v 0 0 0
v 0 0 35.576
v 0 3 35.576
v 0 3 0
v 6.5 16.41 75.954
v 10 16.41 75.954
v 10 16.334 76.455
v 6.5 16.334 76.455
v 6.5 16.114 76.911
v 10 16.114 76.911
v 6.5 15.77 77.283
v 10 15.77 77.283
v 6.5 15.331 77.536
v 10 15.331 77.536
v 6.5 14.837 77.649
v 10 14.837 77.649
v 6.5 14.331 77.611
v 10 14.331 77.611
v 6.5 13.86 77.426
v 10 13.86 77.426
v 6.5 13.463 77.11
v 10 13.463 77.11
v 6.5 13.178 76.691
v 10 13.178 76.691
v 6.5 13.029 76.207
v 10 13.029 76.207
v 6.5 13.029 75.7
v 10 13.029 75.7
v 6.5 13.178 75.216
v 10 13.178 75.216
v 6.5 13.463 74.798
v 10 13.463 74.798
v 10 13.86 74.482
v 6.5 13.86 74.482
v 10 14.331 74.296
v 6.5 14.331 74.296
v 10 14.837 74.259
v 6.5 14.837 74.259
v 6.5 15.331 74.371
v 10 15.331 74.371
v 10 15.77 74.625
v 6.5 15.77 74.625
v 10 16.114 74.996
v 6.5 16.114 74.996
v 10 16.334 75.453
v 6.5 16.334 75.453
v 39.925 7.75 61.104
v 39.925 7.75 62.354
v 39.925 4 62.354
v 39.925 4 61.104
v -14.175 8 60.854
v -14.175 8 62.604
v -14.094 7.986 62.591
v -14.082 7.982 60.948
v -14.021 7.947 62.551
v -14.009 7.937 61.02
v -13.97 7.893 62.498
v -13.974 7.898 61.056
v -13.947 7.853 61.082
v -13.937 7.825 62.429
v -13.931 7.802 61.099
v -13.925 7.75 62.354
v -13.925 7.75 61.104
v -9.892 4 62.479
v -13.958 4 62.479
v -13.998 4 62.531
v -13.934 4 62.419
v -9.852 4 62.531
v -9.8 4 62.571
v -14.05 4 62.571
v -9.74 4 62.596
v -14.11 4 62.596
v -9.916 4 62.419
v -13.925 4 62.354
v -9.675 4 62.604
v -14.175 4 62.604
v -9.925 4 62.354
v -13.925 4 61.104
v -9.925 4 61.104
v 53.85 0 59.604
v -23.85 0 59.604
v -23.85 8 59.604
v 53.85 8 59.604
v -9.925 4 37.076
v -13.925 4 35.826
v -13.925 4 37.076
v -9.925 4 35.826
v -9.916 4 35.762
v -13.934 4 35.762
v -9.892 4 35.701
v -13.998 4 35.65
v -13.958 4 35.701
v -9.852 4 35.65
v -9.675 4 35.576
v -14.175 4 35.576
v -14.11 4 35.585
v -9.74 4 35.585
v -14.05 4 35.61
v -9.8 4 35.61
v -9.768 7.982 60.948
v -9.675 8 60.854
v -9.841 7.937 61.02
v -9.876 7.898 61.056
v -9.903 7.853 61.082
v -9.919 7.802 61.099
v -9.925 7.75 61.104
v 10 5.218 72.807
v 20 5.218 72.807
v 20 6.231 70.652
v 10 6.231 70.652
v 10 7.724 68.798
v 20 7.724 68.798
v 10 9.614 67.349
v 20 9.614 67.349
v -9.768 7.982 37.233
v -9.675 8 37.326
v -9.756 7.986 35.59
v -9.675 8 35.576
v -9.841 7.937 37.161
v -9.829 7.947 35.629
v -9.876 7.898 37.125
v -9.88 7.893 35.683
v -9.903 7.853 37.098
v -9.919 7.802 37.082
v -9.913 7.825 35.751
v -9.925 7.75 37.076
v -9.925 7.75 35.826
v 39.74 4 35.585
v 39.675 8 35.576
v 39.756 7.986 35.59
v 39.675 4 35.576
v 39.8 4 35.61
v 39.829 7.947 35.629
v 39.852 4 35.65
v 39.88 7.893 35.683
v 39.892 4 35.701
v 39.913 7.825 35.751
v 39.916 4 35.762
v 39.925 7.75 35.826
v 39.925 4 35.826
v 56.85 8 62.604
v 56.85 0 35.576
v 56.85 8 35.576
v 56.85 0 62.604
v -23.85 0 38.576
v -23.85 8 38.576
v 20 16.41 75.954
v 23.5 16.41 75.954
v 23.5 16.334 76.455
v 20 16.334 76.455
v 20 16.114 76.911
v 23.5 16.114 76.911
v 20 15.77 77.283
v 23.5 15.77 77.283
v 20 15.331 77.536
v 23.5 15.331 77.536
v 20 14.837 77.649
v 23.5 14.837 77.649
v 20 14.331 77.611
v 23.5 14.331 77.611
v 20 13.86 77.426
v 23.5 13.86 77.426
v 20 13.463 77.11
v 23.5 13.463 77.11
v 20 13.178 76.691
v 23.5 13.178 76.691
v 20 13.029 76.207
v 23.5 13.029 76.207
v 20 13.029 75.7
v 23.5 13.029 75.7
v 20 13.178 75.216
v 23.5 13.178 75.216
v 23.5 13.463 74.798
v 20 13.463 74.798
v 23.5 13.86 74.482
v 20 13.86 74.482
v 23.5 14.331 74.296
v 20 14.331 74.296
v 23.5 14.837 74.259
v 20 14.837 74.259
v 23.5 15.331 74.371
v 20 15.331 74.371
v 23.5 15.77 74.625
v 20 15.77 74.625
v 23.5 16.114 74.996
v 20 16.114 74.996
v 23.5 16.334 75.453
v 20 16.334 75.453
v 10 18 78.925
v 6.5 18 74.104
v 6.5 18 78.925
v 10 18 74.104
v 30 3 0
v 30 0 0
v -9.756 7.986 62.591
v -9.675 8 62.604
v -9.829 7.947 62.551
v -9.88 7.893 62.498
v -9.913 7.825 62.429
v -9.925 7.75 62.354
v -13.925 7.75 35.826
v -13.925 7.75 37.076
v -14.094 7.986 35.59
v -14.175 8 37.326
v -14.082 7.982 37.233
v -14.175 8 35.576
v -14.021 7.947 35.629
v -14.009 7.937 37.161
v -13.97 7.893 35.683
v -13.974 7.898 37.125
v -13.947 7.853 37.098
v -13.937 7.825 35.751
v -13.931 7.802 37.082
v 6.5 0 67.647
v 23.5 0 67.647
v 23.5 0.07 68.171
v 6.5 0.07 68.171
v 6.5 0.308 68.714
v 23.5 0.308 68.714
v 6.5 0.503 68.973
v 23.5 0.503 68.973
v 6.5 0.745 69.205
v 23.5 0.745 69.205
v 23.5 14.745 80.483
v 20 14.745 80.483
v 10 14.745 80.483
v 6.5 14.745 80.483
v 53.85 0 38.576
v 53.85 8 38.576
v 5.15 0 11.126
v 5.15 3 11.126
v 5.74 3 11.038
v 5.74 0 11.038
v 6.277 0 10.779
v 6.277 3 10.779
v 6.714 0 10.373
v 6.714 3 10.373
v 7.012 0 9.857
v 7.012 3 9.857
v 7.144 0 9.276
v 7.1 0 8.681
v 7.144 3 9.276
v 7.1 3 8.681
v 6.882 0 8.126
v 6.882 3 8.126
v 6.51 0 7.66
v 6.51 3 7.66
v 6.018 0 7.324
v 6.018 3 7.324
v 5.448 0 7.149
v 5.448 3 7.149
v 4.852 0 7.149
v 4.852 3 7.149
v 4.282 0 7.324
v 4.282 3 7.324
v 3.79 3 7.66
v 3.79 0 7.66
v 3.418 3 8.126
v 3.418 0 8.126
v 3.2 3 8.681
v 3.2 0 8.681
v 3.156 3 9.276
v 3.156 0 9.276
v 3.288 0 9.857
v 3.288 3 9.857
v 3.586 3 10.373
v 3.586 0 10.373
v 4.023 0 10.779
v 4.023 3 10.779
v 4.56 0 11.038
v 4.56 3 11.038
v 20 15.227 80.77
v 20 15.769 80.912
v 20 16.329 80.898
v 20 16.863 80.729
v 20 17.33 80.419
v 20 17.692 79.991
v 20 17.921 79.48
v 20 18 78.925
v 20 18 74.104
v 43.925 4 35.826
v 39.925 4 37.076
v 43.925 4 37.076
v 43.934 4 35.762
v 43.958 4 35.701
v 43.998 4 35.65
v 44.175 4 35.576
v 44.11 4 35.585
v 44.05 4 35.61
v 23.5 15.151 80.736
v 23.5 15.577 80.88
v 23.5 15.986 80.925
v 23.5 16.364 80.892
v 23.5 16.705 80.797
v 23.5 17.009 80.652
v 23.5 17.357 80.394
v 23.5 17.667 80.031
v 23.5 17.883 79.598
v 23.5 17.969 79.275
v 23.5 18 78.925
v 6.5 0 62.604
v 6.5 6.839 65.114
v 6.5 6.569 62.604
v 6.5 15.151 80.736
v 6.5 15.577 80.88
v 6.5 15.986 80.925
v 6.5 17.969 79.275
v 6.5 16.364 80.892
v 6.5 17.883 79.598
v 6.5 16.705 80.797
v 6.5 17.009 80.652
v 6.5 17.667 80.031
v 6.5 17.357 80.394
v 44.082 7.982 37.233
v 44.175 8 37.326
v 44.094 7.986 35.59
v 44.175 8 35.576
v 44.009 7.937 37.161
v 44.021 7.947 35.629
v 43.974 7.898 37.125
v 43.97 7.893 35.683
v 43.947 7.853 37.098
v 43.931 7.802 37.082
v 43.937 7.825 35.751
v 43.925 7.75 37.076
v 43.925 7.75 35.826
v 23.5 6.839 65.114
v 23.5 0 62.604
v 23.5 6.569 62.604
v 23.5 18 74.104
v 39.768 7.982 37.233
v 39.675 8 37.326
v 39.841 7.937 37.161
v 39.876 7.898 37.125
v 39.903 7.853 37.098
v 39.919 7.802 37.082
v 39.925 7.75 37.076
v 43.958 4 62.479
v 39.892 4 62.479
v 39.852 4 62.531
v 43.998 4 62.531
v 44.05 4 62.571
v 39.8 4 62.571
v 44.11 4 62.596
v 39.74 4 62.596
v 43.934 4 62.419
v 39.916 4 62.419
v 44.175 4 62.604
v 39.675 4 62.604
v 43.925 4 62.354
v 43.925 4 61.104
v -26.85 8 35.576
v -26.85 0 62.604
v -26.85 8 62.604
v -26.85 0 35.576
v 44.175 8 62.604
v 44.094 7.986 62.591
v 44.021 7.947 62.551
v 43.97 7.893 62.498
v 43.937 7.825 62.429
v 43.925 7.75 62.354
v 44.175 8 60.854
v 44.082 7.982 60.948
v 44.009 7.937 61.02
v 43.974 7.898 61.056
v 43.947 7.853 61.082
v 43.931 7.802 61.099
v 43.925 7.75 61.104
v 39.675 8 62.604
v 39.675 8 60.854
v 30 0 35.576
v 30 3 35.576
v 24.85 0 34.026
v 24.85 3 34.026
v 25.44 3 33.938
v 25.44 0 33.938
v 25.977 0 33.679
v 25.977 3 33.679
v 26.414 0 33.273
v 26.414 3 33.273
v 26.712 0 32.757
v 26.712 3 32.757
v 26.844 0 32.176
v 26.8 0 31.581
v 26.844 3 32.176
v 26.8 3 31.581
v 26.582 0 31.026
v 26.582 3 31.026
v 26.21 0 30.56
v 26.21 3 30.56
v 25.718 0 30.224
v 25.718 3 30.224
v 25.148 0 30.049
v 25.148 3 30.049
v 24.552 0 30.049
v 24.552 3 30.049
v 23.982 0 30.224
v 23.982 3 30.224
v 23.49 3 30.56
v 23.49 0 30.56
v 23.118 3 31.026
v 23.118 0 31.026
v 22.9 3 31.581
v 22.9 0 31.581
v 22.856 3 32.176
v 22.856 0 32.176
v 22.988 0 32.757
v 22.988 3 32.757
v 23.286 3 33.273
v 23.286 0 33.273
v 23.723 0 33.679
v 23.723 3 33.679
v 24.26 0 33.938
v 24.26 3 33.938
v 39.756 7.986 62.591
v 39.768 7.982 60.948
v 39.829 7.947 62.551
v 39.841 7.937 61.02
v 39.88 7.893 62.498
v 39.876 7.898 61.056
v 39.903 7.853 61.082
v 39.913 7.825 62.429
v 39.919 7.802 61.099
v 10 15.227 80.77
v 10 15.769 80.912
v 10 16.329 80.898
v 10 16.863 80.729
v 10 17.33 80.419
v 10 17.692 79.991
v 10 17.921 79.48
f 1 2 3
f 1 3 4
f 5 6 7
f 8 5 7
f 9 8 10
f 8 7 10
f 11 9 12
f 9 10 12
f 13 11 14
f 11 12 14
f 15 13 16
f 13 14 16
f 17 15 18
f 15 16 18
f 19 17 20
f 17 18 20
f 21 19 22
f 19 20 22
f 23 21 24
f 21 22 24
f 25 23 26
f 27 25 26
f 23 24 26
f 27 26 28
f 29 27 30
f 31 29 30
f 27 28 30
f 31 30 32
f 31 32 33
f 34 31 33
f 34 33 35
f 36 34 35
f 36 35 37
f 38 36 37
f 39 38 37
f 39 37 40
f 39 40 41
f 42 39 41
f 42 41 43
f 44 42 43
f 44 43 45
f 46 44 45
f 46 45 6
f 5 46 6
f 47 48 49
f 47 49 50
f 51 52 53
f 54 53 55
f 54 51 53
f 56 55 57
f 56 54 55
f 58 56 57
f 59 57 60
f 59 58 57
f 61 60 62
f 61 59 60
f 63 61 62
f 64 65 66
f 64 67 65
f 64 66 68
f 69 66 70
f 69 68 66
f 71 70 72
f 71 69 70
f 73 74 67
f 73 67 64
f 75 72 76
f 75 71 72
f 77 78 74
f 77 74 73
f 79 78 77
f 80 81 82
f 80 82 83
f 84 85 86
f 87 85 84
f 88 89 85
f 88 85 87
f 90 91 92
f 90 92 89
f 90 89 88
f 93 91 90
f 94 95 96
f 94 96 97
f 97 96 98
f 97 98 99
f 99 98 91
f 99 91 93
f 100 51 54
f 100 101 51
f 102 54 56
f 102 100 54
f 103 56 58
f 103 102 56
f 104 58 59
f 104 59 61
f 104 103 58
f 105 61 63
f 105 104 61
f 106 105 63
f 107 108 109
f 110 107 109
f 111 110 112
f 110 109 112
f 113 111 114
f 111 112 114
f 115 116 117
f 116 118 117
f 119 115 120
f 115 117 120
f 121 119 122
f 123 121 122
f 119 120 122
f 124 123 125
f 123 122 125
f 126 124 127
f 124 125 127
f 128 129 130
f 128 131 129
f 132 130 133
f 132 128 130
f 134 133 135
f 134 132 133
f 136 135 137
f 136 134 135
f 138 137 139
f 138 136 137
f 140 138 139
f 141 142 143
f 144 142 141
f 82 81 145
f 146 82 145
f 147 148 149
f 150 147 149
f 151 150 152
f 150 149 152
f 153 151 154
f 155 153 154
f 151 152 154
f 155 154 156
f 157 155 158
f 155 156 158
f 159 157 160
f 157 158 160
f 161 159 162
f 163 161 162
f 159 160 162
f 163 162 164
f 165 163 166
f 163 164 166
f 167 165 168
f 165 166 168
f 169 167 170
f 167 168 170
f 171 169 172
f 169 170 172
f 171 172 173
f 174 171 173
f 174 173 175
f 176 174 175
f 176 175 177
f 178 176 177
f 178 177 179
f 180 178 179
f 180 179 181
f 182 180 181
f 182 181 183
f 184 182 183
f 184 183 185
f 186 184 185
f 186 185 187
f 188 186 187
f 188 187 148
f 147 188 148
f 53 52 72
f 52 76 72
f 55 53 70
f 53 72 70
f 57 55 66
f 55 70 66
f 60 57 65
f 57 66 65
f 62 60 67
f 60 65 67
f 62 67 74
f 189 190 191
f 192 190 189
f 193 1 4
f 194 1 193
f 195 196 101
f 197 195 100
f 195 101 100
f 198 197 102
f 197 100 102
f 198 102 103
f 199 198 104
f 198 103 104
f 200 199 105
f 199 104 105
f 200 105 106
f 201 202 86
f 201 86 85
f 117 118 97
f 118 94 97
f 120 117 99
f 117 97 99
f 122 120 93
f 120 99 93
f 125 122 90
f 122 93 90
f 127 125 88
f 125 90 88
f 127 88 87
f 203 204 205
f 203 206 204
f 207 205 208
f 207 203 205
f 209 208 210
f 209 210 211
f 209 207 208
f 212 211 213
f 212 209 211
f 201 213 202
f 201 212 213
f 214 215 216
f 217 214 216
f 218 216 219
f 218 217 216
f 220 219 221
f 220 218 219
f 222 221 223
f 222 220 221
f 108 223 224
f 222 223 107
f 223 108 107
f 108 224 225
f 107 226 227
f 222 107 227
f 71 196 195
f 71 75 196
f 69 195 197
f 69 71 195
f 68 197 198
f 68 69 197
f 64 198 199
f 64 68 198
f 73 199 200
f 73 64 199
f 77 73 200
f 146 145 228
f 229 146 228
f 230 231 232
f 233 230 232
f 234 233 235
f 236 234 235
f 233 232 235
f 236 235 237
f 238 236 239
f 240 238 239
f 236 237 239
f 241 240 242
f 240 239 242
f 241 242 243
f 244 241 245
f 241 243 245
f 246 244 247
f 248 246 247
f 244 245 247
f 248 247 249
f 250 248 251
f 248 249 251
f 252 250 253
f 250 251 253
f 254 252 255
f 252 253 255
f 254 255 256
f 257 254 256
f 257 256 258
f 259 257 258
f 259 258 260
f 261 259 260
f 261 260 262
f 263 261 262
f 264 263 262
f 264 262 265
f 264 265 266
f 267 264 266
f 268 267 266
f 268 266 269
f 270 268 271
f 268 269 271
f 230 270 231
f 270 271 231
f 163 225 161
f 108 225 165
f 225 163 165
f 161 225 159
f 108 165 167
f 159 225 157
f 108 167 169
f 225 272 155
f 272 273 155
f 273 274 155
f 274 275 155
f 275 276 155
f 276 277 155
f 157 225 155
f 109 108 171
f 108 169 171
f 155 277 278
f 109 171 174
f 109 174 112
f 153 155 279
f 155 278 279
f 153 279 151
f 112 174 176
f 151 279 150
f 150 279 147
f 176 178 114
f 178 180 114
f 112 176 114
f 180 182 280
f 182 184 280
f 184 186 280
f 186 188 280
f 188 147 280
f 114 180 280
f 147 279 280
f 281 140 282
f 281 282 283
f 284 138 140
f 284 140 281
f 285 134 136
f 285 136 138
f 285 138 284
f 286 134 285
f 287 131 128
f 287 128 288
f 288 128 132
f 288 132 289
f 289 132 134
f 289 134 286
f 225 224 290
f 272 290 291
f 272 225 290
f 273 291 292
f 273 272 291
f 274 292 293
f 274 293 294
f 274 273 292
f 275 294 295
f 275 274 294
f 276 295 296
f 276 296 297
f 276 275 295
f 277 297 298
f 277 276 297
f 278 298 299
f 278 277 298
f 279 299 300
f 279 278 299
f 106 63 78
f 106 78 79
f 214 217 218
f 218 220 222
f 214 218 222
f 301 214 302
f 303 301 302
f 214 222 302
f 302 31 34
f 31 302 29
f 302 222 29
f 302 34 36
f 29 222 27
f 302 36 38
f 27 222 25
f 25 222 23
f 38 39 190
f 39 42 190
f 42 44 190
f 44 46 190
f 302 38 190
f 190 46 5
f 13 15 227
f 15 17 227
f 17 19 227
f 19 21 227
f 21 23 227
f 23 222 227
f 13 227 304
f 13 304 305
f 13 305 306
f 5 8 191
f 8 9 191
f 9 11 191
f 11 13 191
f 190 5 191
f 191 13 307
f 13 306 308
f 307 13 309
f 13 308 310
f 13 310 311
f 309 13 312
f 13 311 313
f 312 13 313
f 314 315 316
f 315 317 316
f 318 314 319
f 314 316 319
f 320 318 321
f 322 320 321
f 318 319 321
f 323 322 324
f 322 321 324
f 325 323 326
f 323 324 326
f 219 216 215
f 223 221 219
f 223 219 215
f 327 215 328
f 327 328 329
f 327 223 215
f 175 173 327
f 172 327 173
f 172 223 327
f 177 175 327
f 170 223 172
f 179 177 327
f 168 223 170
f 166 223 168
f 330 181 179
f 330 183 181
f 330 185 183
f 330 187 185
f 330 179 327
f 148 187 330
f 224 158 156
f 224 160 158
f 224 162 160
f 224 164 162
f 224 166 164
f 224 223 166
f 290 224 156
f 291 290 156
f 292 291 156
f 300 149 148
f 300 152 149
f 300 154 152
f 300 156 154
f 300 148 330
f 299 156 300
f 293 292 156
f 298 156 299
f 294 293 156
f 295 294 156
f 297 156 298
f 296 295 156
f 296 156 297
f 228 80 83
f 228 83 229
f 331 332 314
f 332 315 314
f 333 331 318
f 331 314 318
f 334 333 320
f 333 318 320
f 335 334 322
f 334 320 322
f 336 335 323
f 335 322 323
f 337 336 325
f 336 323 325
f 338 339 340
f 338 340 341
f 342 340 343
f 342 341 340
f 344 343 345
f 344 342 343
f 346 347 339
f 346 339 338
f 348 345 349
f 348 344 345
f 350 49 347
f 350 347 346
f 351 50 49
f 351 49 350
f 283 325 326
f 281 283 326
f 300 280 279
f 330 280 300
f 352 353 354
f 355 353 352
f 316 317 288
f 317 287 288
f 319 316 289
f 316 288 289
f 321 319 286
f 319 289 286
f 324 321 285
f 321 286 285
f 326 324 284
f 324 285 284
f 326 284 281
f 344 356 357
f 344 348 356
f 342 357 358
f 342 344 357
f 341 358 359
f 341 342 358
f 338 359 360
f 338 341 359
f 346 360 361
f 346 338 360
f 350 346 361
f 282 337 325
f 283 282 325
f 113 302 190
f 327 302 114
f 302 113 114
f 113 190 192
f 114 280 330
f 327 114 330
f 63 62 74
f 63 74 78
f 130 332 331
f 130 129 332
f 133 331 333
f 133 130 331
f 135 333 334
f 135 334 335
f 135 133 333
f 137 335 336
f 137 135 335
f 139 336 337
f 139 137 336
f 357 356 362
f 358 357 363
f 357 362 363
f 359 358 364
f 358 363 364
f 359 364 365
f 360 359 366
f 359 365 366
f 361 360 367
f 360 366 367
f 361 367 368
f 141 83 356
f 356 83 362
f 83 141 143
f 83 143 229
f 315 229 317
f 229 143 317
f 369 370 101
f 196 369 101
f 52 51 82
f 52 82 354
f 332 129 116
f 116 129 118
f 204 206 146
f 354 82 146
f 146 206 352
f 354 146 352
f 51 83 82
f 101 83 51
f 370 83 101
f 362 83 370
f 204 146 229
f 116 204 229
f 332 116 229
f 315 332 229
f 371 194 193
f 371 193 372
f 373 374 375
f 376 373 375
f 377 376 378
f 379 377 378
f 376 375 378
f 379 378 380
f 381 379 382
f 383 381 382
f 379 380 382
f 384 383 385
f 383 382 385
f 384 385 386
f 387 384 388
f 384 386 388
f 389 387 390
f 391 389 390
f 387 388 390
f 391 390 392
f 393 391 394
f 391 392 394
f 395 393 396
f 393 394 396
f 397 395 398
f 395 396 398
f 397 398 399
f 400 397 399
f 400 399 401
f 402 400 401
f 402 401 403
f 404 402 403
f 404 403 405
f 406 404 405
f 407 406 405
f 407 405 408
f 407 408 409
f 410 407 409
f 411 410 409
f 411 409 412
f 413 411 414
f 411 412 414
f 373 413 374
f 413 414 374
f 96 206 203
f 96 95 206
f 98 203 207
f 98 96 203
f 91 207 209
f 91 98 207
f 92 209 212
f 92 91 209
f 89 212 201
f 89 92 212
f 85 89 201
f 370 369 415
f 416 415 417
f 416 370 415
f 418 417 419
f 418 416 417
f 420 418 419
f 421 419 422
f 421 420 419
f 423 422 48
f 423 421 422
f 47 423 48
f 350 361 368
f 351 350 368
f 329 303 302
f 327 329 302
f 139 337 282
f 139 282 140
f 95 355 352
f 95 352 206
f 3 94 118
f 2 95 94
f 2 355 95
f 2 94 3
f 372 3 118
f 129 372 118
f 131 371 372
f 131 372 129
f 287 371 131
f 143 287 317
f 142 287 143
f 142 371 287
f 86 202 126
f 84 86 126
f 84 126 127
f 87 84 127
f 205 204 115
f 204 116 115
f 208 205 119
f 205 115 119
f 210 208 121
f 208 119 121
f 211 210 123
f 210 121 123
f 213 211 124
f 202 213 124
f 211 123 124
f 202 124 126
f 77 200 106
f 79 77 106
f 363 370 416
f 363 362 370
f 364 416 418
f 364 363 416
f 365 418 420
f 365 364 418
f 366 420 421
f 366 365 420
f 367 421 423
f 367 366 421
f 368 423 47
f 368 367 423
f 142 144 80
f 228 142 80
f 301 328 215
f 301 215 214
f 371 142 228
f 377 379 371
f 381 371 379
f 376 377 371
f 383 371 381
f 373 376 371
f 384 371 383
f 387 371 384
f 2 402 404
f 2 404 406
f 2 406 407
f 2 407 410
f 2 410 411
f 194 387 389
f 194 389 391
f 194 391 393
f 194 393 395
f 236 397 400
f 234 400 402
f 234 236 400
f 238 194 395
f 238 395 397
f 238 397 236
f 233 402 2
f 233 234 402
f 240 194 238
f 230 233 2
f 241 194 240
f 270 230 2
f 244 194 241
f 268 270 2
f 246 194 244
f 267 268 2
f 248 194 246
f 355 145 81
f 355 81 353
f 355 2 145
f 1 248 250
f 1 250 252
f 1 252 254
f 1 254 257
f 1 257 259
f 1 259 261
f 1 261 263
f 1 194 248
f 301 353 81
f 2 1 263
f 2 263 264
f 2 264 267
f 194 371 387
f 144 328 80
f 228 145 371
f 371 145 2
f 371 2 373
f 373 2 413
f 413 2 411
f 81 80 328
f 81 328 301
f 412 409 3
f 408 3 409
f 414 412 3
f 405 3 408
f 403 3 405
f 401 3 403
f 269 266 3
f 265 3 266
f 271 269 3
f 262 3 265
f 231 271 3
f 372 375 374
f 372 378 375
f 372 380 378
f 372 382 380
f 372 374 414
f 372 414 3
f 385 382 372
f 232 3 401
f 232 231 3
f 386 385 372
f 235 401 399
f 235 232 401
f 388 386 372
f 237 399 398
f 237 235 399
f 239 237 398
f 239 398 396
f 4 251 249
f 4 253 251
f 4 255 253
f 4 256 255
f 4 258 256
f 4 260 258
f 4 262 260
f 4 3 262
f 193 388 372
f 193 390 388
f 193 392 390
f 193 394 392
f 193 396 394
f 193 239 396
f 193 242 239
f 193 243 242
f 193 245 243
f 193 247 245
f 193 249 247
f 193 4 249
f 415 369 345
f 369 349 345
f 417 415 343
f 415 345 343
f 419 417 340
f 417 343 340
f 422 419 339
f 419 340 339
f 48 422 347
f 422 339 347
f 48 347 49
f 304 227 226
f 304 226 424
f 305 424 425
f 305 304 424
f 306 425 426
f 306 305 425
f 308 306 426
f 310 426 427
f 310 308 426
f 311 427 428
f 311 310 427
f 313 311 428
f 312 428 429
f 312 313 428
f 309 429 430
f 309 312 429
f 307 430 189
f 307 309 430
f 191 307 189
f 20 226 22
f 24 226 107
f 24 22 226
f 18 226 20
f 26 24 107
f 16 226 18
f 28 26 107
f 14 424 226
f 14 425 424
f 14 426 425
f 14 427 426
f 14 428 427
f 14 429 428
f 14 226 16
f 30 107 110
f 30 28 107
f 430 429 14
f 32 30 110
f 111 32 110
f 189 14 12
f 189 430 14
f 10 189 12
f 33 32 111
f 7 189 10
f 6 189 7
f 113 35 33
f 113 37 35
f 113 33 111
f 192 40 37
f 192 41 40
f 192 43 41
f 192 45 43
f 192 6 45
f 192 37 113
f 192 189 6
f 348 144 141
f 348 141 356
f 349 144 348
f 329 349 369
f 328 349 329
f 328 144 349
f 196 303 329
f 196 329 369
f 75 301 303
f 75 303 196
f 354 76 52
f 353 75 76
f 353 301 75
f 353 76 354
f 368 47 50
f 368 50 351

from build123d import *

# Parameters (mm, degrees)
SKETCH5_W           = 77.7
SKETCH5_H           = 21.028
BOSS_EXTRUDE3_DEPTH = 8
SKETCH6_W           = 30
SKETCH6_H           = 35.57641867
CUT_EXTRUDE4_DEPTH  = 5
SKETCH10_R          = 1.7
CUT_EXTRUDE5_DEPTH  = 17
FILLET4_R           = 2
FILLET5_R           = 2
CHAMFER1_START      = 6.5
CHAMFER1_DEPTH      = 17
SKETCH11_R          = 10
CUT_EXTRUDE6_DEPTH  = 5
SKETCH12_R          = 2
CUT_EXTRUDE7_DEPTH  = 3
SKETCH13_W          = 4
SKETCH13_H          = 1.5
CUT_EXTRUDE8_DEPTH  = 4
FILLET6_R           = 0.25


with BuildPart() as part:
    # Sketch5 → Boss-Extrude3 (new body)
    with BuildSketch(Plane(origin=(0, 0, 0), x_dir=(1, 0, 0), z_dir=(0, 1, 0))):
        Polygon((30, -35.57641867), (56.85, -35.57641867), (56.85, -62.60441867), (-26.85, -62.60441867), (-26.85, -35.57641867), (0, -35.57641867), (0, 0), (30, 0), align=None)
        with Locations((15, -49.09041867)):
            Rectangle(SKETCH5_W, SKETCH5_H, mode=Mode.SUBTRACT)
    extrude(amount=BOSS_EXTRUDE3_DEPTH)

    # Sketch6 → Cut-Extrude4 (cut)
    with BuildSketch(Plane(origin=(0, 8, 0), x_dir=(1, 0, 0), z_dir=(0, 1, 0))):
        with Locations((15, -17.788209335)):
            Rectangle(SKETCH6_W, SKETCH6_H)
    extrude(amount=-CUT_EXTRUDE4_DEPTH, mode=Mode.SUBTRACT)

    # Sketch7 → Loft1 section 0
    with BuildSketch(Plane.XZ):
        with BuildLine():
            Line((6.5, 59.60441867), (23.5, 59.60441867))
            Line((23.5, 59.60441867), (23.5, 68.60441867))
            Line((23.5, 68.60441867), (6.5, 68.60441867))
            Line((6.5, 68.60441867), (6.5, 59.60441867))
        make_face()
    # Sketch9 → Loft1 section 1
    with BuildSketch(Plane(origin=(0, 18, 0), x_dir=(-1, 0, 0), z_dir=(0, -1, 0))):
        with BuildLine():
            Line((-23.5, -83.10441867), (-6.5, -83.10441867))
            Line((-6.5, -83.10441867), (-6.5, -74.10441867))
            Line((-6.5, -74.10441867), (-23.5, -74.10441867))
            Line((-23.5, -74.10441867), (-23.5, -83.10441867))
        make_face()
    loft()

    # Sketch10 → Cut-Extrude5 (cut)
    with BuildSketch(Plane(origin=(23.5, 0, 0), x_dir=(0, 0, -1), z_dir=(1, 0, 0))):
        with Locations(Location((-75.953844744, 14.709632368, 0), (0, 0, 90))):
            Circle(SKETCH10_R)
    extrude(amount=-CUT_EXTRUDE5_DEPTH, mode=Mode.SUBTRACT)

    # Fillet4
    fillet4_edges = [part.edges().sort_by_distance(p)[0] for p in [
        (15, 0, 68.60441867),
    ]]
    fillet(fillet4_edges, radius=FILLET4_R)

    # Fillet5
    fillet5_edges = [part.edges().sort_by_distance(p)[0] for p in [
        (15, 18, 83.10441867),
    ]]
    fillet(fillet5_edges, radius=FILLET5_R)

    # Chamfer1: read off the stored shape, not the designer's step
    # Chamfer1 outline → Chamfer1 (add)
    with BuildSketch(Plane.YZ.offset(CHAMFER1_START)):
        Polygon((6.568919305, 62.60441867), (6.839153567, 65.113736821), (3.724137931, 62.60441867), align=None)
    extrude(amount=CHAMFER1_DEPTH)

    # Sketch11 → Cut-Extrude6 (cut, symmetric)
    with BuildSketch(Plane(origin=(15, 0, 0), x_dir=(0, 0, -1), z_dir=(1, 0, 0))):
        with Locations((-75.953844744, 14.709632368)):
            Circle(SKETCH11_R)
    extrude(amount=CUT_EXTRUDE6_DEPTH, both=True, mode=Mode.SUBTRACT)

    # Sketch12 → Cut-Extrude7 (cut)
    with BuildSketch(Plane(origin=(0, 3, 0), x_dir=(1, 0, 0), z_dir=(0, 1, 0))):
        with Locations(Location((24.85, -32.02641867, 0), (0, 0, 270))):
            Circle(SKETCH12_R)
        with Locations(Location((5.15, -9.12641867, 0), (0, 0, 270))):
            Circle(SKETCH12_R)
    extrude(amount=-CUT_EXTRUDE7_DEPTH, mode=Mode.SUBTRACT)

    # Sketch13 → Cut-Extrude8 (cut)
    with BuildSketch(Plane(origin=(0, 8, 0), x_dir=(1, 0, 0), z_dir=(0, 1, 0))):
        with Locations((-11.925, -36.32641867)):
            Rectangle(SKETCH13_W, SKETCH13_H)
        with Locations((-11.925, -61.85441867)):
            Rectangle(SKETCH13_W, SKETCH13_H)
        with Locations((41.925, -61.85441867)):
            Rectangle(SKETCH13_W, SKETCH13_H)
        with Locations((41.925, -36.32641867)):
            Rectangle(SKETCH13_W, SKETCH13_H)
    extrude(amount=-CUT_EXTRUDE8_DEPTH, mode=Mode.SUBTRACT)

    # Fillet6
    fillet6_edges = [part.edges().sort_by_distance(p)[0] for p in [
        (-9.925, 6, 62.60441867),
        (-13.925, 6, 62.60441867),
        (-9.925, 8, 61.85441867),
        (-11.925, 8, 61.10441867),
        (-13.925, 8, 61.85441867),
        (39.925, 6, 35.57641867),
        (43.925, 6, 35.57641867),
        (39.925, 8, 36.32641867),
        (41.925, 8, 37.07641867),
        (43.925, 8, 36.32641867),
        (39.925, 6, 62.60441867),
        (43.925, 6, 62.60441867),
        (39.925, 8, 61.85441867),
        (43.925, 8, 61.85441867),
        (41.925, 8, 61.10441867),
        (-9.925, 6, 35.57641867),
        (-13.925, 6, 35.57641867),
        (-9.925, 8, 36.32641867),
        (-13.925, 8, 36.32641867),
        (-11.925, 8, 37.07641867),
    ]]
    fillet(fillet6_edges, radius=FILLET6_R)


solid = part.part
